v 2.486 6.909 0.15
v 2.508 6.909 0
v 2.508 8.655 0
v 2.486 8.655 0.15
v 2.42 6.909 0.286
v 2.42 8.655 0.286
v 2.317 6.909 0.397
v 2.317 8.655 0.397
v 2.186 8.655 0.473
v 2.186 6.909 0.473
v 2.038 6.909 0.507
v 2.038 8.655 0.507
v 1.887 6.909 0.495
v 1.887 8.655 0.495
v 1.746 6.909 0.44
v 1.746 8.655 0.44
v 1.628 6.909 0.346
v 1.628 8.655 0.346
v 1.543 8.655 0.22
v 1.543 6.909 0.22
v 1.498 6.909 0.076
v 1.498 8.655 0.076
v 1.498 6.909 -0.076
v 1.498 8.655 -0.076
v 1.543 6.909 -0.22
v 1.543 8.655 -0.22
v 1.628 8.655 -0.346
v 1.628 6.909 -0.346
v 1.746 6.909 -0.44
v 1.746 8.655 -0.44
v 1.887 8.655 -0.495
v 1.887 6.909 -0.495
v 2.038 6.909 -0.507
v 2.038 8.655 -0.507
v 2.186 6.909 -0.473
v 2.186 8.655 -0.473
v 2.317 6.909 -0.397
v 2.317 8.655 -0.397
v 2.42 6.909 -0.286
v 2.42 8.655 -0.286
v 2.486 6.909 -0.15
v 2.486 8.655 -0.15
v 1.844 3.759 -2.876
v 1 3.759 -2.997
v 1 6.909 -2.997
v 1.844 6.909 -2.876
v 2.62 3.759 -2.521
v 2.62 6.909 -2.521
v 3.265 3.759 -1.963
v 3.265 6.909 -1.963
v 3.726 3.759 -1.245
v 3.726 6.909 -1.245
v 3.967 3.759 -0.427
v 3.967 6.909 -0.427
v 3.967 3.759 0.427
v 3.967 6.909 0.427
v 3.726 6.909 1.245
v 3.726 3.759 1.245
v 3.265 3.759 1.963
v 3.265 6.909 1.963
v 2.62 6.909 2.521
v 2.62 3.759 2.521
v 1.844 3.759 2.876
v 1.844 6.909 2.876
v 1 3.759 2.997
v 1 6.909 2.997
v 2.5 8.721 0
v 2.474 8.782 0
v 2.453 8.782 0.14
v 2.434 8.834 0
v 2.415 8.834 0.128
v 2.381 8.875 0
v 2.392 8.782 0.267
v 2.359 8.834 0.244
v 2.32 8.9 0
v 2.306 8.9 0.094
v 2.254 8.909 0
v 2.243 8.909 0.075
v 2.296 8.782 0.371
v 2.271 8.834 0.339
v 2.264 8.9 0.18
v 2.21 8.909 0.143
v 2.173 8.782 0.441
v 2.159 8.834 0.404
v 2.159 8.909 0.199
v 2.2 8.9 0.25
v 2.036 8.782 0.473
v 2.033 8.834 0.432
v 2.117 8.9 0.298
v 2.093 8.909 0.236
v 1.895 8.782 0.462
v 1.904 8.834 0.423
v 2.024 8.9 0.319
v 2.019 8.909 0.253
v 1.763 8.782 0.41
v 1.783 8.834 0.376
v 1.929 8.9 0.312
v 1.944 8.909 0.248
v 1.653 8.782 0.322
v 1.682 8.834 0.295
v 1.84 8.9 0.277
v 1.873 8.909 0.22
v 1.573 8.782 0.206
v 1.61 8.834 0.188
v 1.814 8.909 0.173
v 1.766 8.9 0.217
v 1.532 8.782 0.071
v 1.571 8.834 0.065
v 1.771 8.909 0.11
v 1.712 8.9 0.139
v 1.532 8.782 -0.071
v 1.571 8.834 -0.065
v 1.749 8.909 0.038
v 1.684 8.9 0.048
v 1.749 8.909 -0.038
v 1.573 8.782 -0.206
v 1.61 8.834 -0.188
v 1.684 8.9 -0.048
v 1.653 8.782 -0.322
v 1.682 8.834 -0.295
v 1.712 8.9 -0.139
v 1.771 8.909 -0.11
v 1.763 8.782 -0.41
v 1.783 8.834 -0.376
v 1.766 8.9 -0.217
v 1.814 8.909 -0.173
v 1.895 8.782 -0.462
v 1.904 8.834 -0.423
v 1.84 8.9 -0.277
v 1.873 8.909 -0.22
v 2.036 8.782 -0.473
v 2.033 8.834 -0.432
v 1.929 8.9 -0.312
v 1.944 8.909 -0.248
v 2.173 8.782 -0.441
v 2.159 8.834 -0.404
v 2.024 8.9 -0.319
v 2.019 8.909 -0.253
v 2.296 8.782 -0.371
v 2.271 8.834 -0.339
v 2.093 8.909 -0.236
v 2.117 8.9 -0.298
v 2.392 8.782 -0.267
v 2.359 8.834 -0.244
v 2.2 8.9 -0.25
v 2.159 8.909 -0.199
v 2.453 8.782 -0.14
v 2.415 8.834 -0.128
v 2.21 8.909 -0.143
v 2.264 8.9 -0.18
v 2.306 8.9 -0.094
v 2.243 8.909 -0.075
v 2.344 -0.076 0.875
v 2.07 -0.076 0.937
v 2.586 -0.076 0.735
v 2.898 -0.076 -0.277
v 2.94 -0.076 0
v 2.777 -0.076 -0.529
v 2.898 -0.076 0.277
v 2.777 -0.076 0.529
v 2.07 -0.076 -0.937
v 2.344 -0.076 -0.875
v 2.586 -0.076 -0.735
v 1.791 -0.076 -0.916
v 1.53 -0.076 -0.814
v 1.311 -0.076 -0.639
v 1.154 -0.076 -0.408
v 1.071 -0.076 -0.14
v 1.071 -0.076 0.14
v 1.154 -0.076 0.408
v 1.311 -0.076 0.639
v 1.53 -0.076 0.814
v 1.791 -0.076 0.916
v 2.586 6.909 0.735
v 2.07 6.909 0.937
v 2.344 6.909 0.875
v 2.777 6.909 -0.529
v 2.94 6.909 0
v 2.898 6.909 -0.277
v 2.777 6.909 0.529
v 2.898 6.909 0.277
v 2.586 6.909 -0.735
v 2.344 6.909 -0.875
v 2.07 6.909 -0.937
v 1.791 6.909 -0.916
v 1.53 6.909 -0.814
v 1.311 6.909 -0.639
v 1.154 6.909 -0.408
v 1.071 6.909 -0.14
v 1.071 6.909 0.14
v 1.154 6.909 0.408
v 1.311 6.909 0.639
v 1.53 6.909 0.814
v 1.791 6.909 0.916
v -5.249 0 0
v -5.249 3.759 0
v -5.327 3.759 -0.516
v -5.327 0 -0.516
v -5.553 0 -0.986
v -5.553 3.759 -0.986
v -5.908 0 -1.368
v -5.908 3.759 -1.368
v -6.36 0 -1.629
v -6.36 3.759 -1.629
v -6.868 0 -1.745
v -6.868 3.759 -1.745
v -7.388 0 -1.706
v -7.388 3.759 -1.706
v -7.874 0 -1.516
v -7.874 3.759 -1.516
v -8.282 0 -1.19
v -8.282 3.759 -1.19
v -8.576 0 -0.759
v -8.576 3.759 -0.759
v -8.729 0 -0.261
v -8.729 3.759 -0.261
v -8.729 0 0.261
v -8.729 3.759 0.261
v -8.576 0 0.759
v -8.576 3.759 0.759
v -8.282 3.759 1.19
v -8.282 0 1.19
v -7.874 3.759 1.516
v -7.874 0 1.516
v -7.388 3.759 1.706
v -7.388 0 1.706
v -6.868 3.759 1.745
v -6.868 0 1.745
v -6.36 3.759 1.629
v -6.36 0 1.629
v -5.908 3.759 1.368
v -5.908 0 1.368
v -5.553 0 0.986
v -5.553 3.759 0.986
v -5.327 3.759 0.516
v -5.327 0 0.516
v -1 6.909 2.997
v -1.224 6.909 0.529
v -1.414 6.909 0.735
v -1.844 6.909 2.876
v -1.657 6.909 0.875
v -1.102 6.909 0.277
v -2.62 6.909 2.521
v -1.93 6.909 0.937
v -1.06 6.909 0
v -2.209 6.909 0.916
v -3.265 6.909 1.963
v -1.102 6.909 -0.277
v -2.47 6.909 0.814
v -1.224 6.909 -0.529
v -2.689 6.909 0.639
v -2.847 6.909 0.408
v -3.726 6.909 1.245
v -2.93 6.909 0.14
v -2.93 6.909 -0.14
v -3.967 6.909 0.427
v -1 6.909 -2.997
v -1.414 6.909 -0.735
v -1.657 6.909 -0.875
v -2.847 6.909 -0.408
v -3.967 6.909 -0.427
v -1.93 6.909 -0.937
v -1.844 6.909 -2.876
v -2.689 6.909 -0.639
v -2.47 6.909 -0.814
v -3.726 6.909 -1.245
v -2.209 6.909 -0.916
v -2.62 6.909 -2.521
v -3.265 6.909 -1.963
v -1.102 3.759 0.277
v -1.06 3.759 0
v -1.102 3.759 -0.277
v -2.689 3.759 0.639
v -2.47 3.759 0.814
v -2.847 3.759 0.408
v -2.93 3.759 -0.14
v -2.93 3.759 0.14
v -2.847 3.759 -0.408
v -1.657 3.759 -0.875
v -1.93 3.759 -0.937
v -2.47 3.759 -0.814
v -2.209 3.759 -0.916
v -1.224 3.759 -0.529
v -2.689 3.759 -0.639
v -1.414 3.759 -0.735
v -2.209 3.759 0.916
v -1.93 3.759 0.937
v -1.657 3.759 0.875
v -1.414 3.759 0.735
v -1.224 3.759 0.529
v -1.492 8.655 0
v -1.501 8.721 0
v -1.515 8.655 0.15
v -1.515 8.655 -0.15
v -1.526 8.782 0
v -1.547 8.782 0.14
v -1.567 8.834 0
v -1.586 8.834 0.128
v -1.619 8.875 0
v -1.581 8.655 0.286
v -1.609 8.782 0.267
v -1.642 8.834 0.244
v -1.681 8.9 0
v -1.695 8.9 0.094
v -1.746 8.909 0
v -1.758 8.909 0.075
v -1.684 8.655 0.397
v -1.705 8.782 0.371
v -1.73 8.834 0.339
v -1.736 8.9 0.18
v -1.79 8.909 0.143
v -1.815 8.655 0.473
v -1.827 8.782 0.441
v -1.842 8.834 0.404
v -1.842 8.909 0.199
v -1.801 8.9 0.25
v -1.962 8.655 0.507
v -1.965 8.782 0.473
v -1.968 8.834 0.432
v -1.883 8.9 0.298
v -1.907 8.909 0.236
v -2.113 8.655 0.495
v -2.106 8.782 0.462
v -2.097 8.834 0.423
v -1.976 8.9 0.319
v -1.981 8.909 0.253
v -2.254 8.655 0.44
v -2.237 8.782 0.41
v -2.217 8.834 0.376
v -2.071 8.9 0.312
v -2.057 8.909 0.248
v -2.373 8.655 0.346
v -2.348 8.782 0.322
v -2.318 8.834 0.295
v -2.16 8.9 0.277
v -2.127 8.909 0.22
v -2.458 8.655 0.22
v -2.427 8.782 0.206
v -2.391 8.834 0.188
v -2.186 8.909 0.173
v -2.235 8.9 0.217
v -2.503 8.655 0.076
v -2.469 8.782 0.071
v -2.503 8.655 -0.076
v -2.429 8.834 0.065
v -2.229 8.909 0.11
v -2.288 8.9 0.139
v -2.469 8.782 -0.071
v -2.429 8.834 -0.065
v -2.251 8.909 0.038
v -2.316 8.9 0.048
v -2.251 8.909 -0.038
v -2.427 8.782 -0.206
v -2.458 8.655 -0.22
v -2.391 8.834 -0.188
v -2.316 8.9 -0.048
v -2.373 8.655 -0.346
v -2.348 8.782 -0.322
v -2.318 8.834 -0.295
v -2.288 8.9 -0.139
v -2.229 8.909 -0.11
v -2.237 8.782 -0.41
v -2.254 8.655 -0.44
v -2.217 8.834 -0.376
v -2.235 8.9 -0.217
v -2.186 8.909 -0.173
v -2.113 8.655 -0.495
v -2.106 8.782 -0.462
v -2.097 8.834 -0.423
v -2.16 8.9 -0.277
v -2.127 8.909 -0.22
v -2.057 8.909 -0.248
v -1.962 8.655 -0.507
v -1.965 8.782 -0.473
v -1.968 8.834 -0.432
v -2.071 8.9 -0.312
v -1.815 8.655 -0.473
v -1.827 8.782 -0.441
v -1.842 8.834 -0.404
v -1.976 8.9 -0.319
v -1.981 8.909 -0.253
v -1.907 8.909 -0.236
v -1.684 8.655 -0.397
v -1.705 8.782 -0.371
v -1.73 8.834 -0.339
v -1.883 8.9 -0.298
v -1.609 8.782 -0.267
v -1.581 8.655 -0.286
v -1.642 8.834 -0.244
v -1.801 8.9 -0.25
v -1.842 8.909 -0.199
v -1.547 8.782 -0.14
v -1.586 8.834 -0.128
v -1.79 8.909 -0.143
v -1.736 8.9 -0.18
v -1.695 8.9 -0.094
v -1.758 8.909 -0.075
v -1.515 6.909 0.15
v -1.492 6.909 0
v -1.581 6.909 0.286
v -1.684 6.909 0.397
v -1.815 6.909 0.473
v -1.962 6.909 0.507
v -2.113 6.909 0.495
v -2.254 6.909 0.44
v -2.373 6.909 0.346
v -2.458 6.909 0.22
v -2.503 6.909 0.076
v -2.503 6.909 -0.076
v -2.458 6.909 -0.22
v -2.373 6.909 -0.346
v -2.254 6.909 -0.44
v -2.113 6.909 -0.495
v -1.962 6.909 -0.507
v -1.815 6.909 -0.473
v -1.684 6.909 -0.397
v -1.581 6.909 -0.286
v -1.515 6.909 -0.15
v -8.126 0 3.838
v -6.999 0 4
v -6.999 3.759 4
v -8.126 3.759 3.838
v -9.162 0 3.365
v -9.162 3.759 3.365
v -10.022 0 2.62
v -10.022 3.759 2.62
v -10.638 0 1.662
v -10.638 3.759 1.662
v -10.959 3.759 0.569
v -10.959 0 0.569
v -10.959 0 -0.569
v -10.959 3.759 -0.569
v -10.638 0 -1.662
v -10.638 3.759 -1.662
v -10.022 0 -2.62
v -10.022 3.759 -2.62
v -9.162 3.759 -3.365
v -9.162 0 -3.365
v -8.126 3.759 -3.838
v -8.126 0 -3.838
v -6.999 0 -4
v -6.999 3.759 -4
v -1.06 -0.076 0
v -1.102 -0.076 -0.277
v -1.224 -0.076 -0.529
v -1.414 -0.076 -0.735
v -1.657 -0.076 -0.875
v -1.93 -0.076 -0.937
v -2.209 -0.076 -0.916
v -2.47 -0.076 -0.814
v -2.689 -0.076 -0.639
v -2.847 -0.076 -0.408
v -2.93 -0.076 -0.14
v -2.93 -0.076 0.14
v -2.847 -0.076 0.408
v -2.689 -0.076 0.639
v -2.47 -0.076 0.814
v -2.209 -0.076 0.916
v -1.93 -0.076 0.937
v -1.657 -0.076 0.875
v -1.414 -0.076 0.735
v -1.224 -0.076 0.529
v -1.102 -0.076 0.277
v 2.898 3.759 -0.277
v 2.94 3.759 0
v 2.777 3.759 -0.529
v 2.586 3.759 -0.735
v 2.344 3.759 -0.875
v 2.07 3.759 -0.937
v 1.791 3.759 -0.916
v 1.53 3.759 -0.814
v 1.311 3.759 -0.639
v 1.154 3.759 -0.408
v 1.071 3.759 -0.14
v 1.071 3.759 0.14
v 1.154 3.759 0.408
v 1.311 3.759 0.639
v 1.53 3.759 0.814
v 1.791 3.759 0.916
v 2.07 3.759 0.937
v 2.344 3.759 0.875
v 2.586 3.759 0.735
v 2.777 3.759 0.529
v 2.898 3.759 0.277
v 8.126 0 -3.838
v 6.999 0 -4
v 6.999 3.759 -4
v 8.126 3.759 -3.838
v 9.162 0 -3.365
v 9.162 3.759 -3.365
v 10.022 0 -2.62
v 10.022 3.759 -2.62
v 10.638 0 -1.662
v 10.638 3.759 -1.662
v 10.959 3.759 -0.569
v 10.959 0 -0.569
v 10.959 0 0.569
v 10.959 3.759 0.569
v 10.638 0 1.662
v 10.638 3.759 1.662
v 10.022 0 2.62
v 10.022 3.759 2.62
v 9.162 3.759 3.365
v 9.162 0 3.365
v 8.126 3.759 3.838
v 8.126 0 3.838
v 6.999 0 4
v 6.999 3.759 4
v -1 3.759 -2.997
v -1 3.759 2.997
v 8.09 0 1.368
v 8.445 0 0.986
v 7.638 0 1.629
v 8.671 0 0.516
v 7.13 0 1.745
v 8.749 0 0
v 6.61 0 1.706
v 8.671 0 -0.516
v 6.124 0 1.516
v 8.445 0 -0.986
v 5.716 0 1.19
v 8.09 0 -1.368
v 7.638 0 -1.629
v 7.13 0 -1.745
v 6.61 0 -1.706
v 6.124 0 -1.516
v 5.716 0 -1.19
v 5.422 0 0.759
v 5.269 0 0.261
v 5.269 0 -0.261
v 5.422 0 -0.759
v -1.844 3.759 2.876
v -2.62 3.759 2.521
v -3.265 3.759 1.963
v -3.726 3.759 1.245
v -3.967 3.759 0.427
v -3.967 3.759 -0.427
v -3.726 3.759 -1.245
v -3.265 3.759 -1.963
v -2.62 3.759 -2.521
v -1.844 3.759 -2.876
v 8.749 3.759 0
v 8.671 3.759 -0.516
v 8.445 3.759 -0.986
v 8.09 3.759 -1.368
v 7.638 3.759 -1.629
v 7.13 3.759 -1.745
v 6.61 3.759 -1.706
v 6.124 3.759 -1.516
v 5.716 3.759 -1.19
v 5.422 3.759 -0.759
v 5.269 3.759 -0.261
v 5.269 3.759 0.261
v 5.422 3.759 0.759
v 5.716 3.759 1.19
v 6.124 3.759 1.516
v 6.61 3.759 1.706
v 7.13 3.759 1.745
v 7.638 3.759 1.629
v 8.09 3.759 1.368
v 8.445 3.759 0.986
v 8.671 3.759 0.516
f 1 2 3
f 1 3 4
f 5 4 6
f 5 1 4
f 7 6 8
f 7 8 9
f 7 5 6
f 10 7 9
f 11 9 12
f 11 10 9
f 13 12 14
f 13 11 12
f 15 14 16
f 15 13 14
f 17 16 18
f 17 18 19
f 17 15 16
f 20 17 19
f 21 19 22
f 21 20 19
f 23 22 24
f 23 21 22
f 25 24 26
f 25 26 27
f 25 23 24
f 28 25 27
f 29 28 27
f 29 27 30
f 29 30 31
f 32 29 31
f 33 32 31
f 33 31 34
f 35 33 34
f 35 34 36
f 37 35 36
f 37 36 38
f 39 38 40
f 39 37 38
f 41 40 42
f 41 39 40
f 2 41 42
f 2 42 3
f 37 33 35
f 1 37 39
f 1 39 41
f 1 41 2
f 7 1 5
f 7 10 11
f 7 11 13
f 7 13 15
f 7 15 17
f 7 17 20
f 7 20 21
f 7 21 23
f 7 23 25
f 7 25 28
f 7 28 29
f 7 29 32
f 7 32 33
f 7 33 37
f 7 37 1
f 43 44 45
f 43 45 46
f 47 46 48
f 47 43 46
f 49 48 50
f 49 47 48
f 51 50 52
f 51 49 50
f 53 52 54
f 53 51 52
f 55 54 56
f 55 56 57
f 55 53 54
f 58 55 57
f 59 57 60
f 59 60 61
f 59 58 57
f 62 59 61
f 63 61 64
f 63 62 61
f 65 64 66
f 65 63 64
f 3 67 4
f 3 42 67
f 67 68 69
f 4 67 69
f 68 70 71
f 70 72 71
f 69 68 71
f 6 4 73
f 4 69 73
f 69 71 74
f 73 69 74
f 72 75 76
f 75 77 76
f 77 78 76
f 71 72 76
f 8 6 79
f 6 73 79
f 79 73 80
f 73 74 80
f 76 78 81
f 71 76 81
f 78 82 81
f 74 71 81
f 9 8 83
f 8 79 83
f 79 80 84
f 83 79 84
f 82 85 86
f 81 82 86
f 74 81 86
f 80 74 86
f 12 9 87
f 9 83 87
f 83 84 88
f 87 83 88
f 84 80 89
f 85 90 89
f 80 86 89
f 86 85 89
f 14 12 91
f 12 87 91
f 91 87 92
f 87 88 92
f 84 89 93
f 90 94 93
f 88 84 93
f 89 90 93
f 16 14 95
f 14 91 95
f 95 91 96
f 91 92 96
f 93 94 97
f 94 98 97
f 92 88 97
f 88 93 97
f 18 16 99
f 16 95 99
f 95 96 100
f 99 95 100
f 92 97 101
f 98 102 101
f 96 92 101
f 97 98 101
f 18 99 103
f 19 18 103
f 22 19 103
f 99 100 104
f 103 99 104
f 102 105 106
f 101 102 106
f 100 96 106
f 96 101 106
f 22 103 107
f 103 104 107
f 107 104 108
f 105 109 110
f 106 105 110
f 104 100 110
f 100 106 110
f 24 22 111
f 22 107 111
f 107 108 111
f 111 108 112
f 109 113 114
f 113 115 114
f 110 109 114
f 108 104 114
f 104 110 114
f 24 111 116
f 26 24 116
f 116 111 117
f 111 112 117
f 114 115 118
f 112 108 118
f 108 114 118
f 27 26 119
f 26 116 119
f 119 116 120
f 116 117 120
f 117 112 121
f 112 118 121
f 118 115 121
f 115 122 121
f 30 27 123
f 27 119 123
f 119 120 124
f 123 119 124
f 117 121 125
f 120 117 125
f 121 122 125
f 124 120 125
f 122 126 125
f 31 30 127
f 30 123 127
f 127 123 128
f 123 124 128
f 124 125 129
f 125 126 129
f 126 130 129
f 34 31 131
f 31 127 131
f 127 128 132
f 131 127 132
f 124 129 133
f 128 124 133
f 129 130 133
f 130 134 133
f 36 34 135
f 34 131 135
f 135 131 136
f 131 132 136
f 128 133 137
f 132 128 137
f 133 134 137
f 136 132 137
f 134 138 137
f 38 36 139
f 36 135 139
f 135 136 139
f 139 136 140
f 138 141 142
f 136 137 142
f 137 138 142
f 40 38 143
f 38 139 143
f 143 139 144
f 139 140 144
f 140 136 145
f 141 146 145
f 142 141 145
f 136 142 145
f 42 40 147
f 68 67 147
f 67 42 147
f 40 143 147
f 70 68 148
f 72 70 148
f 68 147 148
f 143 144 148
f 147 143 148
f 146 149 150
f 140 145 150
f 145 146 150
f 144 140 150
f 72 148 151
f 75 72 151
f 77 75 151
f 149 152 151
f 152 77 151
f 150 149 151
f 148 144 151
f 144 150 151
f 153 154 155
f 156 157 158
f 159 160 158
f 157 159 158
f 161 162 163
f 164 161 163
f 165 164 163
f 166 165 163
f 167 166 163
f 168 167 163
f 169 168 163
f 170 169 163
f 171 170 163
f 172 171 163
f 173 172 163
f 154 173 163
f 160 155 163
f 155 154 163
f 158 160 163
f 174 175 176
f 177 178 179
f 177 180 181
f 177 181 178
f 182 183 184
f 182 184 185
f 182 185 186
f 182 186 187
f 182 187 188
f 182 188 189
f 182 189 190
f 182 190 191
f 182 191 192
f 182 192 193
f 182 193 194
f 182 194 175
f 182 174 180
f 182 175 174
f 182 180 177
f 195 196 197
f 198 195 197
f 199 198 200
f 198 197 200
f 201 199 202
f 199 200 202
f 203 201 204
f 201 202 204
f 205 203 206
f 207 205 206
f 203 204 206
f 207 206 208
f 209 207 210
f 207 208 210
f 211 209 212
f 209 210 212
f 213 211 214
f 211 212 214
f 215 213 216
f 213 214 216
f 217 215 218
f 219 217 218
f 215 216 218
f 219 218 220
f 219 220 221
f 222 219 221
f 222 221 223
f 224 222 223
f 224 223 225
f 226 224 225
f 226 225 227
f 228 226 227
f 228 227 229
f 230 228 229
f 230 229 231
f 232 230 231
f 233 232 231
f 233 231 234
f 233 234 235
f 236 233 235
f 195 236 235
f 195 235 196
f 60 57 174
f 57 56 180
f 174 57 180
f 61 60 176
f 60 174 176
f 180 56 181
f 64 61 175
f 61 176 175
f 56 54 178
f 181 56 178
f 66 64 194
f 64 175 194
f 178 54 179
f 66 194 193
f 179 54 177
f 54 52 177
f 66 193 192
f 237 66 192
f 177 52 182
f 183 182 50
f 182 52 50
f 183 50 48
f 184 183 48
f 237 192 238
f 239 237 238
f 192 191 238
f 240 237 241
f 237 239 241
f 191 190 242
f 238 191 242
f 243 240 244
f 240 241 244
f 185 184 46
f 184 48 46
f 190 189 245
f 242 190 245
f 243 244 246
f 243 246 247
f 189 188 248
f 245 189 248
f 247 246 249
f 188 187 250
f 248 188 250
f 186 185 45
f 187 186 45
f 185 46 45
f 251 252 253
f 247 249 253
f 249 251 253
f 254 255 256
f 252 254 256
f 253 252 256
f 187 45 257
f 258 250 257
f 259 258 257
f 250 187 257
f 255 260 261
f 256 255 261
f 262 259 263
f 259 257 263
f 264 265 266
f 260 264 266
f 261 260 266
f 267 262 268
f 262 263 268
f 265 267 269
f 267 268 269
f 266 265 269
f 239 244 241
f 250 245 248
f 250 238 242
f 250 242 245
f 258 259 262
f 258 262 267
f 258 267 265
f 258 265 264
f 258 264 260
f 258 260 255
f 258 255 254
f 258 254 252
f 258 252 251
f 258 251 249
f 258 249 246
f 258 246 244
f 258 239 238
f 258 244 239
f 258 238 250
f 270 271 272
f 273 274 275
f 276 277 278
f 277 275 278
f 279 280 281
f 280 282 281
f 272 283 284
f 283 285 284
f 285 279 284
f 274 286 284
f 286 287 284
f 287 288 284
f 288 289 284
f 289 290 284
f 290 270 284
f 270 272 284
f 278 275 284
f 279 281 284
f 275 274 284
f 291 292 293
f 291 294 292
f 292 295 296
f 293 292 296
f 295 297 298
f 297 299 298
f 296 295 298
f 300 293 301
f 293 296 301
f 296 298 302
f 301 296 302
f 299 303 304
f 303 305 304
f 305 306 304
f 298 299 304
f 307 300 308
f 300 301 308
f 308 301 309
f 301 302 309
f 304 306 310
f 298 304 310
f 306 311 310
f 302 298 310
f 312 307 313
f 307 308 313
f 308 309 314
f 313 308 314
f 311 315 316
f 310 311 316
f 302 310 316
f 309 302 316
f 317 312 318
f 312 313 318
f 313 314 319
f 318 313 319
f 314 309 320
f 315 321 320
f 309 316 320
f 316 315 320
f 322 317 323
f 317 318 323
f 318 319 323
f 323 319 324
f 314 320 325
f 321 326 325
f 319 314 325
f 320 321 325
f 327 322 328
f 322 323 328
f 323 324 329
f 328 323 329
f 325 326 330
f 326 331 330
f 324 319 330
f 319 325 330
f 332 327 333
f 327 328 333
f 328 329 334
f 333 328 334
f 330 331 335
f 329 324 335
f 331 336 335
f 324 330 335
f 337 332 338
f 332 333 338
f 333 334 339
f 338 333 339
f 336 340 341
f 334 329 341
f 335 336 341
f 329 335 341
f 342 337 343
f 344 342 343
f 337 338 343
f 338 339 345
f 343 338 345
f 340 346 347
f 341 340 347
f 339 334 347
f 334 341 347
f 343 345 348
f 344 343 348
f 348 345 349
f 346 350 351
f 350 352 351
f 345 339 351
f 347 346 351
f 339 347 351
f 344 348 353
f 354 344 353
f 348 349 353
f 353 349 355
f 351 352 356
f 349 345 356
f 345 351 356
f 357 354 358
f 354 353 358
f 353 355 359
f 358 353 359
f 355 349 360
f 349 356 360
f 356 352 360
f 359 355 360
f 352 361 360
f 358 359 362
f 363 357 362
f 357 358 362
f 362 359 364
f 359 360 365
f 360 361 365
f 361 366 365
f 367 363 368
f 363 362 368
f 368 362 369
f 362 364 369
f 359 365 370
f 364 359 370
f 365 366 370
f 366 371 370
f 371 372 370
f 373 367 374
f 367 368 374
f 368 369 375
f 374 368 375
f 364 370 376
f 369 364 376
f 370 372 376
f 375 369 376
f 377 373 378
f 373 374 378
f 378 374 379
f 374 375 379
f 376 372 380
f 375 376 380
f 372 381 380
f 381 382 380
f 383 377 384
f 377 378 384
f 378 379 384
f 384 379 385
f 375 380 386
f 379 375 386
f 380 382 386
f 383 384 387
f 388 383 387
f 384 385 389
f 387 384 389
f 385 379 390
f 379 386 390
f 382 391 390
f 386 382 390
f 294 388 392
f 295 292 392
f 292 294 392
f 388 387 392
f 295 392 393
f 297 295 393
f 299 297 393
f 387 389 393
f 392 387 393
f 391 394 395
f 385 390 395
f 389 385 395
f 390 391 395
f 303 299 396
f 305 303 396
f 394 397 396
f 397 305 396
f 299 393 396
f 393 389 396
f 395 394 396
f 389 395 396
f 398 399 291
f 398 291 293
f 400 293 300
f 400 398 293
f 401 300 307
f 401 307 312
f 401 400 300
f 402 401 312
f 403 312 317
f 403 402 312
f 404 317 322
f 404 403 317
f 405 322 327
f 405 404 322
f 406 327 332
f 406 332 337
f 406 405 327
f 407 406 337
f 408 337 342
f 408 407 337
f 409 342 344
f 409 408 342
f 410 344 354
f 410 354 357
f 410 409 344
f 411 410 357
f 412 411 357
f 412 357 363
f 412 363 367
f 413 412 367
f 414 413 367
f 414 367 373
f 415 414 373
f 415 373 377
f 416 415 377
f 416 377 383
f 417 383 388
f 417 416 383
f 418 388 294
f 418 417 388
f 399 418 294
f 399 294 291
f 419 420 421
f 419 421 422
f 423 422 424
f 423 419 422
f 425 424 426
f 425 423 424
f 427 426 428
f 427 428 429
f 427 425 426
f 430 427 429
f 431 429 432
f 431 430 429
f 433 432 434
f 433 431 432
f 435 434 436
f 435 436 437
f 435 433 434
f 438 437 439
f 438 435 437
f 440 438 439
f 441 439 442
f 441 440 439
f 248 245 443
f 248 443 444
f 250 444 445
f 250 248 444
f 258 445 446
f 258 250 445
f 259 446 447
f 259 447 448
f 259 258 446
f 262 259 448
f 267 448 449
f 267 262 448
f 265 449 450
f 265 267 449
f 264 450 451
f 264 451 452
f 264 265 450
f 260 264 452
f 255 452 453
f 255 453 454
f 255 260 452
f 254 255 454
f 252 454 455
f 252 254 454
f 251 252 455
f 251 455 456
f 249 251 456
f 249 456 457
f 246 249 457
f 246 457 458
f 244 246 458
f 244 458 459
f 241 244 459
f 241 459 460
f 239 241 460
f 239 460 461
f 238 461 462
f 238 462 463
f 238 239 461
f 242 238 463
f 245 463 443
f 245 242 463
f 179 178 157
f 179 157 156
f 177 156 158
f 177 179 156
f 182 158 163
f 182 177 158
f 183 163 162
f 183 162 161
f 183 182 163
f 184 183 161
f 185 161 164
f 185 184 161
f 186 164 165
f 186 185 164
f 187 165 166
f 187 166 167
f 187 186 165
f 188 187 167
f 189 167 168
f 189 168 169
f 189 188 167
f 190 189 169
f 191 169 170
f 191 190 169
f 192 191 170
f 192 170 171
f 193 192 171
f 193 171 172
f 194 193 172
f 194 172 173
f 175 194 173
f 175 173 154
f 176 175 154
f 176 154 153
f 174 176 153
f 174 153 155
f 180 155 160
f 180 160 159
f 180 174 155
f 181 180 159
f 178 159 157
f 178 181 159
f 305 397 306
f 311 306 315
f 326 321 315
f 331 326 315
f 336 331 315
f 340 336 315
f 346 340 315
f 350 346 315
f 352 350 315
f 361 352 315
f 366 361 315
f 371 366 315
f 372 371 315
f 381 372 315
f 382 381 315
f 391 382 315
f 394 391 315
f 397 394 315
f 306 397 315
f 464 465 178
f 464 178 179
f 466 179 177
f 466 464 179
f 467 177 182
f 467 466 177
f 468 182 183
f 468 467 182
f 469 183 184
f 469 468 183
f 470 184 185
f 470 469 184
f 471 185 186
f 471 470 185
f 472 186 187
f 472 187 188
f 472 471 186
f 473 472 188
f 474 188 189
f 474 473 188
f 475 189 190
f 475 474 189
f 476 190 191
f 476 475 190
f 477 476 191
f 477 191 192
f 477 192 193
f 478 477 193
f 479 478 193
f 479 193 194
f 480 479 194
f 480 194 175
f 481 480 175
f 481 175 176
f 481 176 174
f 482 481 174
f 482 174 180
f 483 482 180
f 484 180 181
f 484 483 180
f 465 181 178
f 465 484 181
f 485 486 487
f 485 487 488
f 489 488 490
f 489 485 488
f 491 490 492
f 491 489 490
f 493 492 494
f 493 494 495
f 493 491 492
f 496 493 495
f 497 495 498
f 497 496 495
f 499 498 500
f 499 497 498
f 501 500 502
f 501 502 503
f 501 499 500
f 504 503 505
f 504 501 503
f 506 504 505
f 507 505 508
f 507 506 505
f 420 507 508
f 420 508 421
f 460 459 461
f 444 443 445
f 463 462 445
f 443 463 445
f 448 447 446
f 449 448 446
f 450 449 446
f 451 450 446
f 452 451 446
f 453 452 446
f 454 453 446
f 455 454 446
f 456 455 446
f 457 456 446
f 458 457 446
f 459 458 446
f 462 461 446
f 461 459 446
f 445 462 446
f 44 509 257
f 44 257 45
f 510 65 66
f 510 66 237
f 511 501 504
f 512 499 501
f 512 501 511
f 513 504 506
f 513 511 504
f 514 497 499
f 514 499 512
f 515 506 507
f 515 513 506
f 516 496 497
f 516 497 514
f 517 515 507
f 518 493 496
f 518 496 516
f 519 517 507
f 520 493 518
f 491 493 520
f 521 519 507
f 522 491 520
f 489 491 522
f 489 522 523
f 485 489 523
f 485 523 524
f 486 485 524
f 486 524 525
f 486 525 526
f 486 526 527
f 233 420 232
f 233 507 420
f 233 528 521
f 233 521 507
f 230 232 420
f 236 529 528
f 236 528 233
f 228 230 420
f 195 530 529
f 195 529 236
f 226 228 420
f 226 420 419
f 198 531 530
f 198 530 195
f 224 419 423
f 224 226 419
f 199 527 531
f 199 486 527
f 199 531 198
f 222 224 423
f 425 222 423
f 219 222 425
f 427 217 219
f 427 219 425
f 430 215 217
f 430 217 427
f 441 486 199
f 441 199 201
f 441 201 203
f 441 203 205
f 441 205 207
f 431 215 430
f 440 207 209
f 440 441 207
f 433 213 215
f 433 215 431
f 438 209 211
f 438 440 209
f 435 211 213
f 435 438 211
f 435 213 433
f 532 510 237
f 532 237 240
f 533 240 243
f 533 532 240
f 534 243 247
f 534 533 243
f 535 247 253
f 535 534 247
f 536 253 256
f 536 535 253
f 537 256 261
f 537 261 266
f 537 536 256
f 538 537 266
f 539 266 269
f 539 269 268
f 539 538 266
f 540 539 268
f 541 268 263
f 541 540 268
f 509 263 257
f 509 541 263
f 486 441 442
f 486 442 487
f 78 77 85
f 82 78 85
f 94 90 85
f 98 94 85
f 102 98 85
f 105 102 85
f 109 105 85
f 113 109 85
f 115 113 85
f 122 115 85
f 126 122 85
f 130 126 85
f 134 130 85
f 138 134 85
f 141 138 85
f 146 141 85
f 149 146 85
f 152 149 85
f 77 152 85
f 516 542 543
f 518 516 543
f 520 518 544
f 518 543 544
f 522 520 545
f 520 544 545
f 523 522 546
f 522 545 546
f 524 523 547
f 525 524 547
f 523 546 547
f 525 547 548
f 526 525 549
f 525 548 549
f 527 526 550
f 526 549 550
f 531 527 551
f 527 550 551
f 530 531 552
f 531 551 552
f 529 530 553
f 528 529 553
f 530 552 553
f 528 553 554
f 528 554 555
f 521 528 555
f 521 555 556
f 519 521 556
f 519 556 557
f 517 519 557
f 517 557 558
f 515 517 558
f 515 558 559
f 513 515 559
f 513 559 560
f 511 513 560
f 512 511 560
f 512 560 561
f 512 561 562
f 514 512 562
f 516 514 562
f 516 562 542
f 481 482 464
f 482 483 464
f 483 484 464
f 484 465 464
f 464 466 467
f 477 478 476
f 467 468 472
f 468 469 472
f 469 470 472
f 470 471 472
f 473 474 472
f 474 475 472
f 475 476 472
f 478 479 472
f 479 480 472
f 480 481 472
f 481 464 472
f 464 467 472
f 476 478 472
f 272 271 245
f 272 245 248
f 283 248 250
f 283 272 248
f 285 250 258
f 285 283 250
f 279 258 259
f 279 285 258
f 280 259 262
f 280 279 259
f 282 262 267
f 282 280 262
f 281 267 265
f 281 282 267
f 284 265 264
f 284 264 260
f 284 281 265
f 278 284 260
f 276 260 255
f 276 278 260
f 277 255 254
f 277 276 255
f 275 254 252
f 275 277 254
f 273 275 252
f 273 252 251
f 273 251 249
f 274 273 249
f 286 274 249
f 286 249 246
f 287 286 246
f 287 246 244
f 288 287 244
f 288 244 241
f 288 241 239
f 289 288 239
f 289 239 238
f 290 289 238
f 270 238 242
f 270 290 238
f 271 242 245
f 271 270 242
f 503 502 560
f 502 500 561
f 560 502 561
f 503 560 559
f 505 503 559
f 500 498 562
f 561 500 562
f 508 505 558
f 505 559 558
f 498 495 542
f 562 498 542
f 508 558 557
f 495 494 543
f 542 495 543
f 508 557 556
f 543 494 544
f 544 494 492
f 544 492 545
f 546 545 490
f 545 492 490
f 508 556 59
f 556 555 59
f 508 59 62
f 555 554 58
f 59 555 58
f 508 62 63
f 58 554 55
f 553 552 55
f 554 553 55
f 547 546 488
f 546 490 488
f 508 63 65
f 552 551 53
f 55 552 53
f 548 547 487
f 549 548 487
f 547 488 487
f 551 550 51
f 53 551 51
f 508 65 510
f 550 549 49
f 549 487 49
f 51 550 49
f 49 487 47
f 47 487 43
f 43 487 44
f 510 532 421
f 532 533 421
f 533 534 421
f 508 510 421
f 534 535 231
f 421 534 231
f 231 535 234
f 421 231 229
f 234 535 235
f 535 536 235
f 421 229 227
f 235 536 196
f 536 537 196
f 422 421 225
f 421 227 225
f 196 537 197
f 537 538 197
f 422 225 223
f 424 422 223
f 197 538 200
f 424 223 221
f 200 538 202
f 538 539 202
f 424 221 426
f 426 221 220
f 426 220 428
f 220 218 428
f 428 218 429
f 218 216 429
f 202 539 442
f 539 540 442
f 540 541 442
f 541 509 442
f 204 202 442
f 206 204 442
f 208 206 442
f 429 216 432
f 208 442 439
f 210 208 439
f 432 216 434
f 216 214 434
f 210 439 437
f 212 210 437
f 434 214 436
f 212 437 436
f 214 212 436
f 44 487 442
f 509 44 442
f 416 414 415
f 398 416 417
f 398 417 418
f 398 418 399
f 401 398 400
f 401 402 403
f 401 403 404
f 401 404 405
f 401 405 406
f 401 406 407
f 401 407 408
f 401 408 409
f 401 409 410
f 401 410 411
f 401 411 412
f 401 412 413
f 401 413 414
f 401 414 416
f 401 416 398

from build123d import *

# Parameters (mm, degrees)
BOSS_EXTRUDE1_DEPTH   = 3.7592
SKETCH2_R             = 0.9398
BOSS_EXTRUDE2_DEPTH   = 3.1496
SKETCH3_R             = 0.9398
BOSS_EXTRUDE3_DEPTH   = 6.985
BOSS_EXTRUDE3_2_DEPTH = 6.985
SKETCH4_R             = 0.508
BOSS_EXTRUDE4_DEPTH   = 2
BOSS_EXTRUDE4_2_DEPTH = 2
FILLET1_R             = 0.254
FILLET2_R             = 0.254
SKETCH5_R             = 1.75
CUT_EXTRUDE1_DEPTH    = 4.8354


with BuildPart() as part:
    # Sketch1 → Boss-Extrude1 (new body)
    with BuildSketch(Plane(origin=(0, 0, 0), x_dir=(1, 0, 0), z_dir=(0, 1, 0))):
        with BuildLine():
            Line((-6.99897, 4.0005), (6.99897, 4.0005))
            ThreePointArc((6.99897, 4.0005), (10.99947, 0), (6.99897, -4.0005))
            Line((6.99897, -4.0005), (-6.99897, -4.0005))
            ThreePointArc((-6.99897, -4.0005), (-10.99947, 0), (-6.99897, 4.0005))
        make_face()
    extrude(amount=BOSS_EXTRUDE1_DEPTH)

    # Sketch2 → Boss-Extrude2 (add)
    with BuildSketch(Plane(origin=(0, 3.7592, 0), x_dir=(1, 0, 0), z_dir=(0, 1, 0))):
        with BuildLine():
            Line((-1, 2.9972), (1, 2.9972))
            ThreePointArc((1, 2.9972), (3.9972, 0), (1, -2.9972))
            Line((1, -2.9972), (-1, -2.9972))
            ThreePointArc((-1, -2.9972), (-3.9972, 0), (-1, 2.9972))
        make_face()
        with Locations((-2.00025, 0)):
            Circle(SKETCH2_R, mode=Mode.SUBTRACT)
        with Locations((2.00025, 0)):
            Circle(SKETCH2_R, mode=Mode.SUBTRACT)
    extrude(amount=BOSS_EXTRUDE2_DEPTH)

    # Sketch5 → Cut-Extrude1 (cut, through all)
    with BuildSketch(Plane(origin=(0, 3.7592, 0), x_dir=(1, 0, 0), z_dir=(0, 1, 0))):
        with Locations((-6.99897, 0)):
            Circle(SKETCH5_R)
        with Locations((6.99897, 0)):
            Circle(SKETCH5_R)
    extrude(amount=-CUT_EXTRUDE1_DEPTH, mode=Mode.SUBTRACT)


with BuildPart() as body_2:
    # Sketch3 → Boss-Extrude3 (new body)
    with BuildSketch(Plane(origin=(0, 6.9088, 0), x_dir=(1, 0, 0), z_dir=(0, 1, 0))):
        with Locations((-2.00025, 0)):
            Circle(SKETCH3_R)
    extrude(amount=-BOSS_EXTRUDE3_DEPTH)


with BuildPart() as body_3:
    # Sketch3 → Boss-Extrude3 2 (new body)
    with BuildSketch(Plane(origin=(0, 6.9088, 0), x_dir=(1, 0, 0), z_dir=(0, 1, 0))):
        with Locations((2.00025, 0)):
            Circle(SKETCH3_R)
    extrude(amount=-BOSS_EXTRUDE3_2_DEPTH)


with BuildPart() as body_4:
    # Sketch4 → Boss-Extrude4 (new body)
    with BuildSketch(Plane.XZ.offset(-6.9088)):
        with Locations((-2.00025, 0)):
            Circle(SKETCH4_R)
    extrude(amount=-BOSS_EXTRUDE4_DEPTH)

    # Fillet1
    fillet1_edges = [body_4.edges().sort_by_distance(p)[0] for p in [
        (-2.50825, 8.9088, 0),
    ]]
    fillet(fillet1_edges, radius=FILLET1_R)


with BuildPart() as body_5:
    # Sketch4 → Boss-Extrude4 2 (new body)
    with BuildSketch(Plane.XZ.offset(-6.9088)):
        with Locations((2.00025, 0)):
            Circle(SKETCH4_R)
    extrude(amount=-BOSS_EXTRUDE4_2_DEPTH)

    # Fillet2
    fillet2_edges = [body_5.edges().sort_by_distance(p)[0] for p in [
        (1.49225, 8.9088, 0),
    ]]
    fillet(fillet2_edges, radius=FILLET2_R)


solid = Compound([part.part, body_2.part, body_3.part, body_4.part, body_5.part])
